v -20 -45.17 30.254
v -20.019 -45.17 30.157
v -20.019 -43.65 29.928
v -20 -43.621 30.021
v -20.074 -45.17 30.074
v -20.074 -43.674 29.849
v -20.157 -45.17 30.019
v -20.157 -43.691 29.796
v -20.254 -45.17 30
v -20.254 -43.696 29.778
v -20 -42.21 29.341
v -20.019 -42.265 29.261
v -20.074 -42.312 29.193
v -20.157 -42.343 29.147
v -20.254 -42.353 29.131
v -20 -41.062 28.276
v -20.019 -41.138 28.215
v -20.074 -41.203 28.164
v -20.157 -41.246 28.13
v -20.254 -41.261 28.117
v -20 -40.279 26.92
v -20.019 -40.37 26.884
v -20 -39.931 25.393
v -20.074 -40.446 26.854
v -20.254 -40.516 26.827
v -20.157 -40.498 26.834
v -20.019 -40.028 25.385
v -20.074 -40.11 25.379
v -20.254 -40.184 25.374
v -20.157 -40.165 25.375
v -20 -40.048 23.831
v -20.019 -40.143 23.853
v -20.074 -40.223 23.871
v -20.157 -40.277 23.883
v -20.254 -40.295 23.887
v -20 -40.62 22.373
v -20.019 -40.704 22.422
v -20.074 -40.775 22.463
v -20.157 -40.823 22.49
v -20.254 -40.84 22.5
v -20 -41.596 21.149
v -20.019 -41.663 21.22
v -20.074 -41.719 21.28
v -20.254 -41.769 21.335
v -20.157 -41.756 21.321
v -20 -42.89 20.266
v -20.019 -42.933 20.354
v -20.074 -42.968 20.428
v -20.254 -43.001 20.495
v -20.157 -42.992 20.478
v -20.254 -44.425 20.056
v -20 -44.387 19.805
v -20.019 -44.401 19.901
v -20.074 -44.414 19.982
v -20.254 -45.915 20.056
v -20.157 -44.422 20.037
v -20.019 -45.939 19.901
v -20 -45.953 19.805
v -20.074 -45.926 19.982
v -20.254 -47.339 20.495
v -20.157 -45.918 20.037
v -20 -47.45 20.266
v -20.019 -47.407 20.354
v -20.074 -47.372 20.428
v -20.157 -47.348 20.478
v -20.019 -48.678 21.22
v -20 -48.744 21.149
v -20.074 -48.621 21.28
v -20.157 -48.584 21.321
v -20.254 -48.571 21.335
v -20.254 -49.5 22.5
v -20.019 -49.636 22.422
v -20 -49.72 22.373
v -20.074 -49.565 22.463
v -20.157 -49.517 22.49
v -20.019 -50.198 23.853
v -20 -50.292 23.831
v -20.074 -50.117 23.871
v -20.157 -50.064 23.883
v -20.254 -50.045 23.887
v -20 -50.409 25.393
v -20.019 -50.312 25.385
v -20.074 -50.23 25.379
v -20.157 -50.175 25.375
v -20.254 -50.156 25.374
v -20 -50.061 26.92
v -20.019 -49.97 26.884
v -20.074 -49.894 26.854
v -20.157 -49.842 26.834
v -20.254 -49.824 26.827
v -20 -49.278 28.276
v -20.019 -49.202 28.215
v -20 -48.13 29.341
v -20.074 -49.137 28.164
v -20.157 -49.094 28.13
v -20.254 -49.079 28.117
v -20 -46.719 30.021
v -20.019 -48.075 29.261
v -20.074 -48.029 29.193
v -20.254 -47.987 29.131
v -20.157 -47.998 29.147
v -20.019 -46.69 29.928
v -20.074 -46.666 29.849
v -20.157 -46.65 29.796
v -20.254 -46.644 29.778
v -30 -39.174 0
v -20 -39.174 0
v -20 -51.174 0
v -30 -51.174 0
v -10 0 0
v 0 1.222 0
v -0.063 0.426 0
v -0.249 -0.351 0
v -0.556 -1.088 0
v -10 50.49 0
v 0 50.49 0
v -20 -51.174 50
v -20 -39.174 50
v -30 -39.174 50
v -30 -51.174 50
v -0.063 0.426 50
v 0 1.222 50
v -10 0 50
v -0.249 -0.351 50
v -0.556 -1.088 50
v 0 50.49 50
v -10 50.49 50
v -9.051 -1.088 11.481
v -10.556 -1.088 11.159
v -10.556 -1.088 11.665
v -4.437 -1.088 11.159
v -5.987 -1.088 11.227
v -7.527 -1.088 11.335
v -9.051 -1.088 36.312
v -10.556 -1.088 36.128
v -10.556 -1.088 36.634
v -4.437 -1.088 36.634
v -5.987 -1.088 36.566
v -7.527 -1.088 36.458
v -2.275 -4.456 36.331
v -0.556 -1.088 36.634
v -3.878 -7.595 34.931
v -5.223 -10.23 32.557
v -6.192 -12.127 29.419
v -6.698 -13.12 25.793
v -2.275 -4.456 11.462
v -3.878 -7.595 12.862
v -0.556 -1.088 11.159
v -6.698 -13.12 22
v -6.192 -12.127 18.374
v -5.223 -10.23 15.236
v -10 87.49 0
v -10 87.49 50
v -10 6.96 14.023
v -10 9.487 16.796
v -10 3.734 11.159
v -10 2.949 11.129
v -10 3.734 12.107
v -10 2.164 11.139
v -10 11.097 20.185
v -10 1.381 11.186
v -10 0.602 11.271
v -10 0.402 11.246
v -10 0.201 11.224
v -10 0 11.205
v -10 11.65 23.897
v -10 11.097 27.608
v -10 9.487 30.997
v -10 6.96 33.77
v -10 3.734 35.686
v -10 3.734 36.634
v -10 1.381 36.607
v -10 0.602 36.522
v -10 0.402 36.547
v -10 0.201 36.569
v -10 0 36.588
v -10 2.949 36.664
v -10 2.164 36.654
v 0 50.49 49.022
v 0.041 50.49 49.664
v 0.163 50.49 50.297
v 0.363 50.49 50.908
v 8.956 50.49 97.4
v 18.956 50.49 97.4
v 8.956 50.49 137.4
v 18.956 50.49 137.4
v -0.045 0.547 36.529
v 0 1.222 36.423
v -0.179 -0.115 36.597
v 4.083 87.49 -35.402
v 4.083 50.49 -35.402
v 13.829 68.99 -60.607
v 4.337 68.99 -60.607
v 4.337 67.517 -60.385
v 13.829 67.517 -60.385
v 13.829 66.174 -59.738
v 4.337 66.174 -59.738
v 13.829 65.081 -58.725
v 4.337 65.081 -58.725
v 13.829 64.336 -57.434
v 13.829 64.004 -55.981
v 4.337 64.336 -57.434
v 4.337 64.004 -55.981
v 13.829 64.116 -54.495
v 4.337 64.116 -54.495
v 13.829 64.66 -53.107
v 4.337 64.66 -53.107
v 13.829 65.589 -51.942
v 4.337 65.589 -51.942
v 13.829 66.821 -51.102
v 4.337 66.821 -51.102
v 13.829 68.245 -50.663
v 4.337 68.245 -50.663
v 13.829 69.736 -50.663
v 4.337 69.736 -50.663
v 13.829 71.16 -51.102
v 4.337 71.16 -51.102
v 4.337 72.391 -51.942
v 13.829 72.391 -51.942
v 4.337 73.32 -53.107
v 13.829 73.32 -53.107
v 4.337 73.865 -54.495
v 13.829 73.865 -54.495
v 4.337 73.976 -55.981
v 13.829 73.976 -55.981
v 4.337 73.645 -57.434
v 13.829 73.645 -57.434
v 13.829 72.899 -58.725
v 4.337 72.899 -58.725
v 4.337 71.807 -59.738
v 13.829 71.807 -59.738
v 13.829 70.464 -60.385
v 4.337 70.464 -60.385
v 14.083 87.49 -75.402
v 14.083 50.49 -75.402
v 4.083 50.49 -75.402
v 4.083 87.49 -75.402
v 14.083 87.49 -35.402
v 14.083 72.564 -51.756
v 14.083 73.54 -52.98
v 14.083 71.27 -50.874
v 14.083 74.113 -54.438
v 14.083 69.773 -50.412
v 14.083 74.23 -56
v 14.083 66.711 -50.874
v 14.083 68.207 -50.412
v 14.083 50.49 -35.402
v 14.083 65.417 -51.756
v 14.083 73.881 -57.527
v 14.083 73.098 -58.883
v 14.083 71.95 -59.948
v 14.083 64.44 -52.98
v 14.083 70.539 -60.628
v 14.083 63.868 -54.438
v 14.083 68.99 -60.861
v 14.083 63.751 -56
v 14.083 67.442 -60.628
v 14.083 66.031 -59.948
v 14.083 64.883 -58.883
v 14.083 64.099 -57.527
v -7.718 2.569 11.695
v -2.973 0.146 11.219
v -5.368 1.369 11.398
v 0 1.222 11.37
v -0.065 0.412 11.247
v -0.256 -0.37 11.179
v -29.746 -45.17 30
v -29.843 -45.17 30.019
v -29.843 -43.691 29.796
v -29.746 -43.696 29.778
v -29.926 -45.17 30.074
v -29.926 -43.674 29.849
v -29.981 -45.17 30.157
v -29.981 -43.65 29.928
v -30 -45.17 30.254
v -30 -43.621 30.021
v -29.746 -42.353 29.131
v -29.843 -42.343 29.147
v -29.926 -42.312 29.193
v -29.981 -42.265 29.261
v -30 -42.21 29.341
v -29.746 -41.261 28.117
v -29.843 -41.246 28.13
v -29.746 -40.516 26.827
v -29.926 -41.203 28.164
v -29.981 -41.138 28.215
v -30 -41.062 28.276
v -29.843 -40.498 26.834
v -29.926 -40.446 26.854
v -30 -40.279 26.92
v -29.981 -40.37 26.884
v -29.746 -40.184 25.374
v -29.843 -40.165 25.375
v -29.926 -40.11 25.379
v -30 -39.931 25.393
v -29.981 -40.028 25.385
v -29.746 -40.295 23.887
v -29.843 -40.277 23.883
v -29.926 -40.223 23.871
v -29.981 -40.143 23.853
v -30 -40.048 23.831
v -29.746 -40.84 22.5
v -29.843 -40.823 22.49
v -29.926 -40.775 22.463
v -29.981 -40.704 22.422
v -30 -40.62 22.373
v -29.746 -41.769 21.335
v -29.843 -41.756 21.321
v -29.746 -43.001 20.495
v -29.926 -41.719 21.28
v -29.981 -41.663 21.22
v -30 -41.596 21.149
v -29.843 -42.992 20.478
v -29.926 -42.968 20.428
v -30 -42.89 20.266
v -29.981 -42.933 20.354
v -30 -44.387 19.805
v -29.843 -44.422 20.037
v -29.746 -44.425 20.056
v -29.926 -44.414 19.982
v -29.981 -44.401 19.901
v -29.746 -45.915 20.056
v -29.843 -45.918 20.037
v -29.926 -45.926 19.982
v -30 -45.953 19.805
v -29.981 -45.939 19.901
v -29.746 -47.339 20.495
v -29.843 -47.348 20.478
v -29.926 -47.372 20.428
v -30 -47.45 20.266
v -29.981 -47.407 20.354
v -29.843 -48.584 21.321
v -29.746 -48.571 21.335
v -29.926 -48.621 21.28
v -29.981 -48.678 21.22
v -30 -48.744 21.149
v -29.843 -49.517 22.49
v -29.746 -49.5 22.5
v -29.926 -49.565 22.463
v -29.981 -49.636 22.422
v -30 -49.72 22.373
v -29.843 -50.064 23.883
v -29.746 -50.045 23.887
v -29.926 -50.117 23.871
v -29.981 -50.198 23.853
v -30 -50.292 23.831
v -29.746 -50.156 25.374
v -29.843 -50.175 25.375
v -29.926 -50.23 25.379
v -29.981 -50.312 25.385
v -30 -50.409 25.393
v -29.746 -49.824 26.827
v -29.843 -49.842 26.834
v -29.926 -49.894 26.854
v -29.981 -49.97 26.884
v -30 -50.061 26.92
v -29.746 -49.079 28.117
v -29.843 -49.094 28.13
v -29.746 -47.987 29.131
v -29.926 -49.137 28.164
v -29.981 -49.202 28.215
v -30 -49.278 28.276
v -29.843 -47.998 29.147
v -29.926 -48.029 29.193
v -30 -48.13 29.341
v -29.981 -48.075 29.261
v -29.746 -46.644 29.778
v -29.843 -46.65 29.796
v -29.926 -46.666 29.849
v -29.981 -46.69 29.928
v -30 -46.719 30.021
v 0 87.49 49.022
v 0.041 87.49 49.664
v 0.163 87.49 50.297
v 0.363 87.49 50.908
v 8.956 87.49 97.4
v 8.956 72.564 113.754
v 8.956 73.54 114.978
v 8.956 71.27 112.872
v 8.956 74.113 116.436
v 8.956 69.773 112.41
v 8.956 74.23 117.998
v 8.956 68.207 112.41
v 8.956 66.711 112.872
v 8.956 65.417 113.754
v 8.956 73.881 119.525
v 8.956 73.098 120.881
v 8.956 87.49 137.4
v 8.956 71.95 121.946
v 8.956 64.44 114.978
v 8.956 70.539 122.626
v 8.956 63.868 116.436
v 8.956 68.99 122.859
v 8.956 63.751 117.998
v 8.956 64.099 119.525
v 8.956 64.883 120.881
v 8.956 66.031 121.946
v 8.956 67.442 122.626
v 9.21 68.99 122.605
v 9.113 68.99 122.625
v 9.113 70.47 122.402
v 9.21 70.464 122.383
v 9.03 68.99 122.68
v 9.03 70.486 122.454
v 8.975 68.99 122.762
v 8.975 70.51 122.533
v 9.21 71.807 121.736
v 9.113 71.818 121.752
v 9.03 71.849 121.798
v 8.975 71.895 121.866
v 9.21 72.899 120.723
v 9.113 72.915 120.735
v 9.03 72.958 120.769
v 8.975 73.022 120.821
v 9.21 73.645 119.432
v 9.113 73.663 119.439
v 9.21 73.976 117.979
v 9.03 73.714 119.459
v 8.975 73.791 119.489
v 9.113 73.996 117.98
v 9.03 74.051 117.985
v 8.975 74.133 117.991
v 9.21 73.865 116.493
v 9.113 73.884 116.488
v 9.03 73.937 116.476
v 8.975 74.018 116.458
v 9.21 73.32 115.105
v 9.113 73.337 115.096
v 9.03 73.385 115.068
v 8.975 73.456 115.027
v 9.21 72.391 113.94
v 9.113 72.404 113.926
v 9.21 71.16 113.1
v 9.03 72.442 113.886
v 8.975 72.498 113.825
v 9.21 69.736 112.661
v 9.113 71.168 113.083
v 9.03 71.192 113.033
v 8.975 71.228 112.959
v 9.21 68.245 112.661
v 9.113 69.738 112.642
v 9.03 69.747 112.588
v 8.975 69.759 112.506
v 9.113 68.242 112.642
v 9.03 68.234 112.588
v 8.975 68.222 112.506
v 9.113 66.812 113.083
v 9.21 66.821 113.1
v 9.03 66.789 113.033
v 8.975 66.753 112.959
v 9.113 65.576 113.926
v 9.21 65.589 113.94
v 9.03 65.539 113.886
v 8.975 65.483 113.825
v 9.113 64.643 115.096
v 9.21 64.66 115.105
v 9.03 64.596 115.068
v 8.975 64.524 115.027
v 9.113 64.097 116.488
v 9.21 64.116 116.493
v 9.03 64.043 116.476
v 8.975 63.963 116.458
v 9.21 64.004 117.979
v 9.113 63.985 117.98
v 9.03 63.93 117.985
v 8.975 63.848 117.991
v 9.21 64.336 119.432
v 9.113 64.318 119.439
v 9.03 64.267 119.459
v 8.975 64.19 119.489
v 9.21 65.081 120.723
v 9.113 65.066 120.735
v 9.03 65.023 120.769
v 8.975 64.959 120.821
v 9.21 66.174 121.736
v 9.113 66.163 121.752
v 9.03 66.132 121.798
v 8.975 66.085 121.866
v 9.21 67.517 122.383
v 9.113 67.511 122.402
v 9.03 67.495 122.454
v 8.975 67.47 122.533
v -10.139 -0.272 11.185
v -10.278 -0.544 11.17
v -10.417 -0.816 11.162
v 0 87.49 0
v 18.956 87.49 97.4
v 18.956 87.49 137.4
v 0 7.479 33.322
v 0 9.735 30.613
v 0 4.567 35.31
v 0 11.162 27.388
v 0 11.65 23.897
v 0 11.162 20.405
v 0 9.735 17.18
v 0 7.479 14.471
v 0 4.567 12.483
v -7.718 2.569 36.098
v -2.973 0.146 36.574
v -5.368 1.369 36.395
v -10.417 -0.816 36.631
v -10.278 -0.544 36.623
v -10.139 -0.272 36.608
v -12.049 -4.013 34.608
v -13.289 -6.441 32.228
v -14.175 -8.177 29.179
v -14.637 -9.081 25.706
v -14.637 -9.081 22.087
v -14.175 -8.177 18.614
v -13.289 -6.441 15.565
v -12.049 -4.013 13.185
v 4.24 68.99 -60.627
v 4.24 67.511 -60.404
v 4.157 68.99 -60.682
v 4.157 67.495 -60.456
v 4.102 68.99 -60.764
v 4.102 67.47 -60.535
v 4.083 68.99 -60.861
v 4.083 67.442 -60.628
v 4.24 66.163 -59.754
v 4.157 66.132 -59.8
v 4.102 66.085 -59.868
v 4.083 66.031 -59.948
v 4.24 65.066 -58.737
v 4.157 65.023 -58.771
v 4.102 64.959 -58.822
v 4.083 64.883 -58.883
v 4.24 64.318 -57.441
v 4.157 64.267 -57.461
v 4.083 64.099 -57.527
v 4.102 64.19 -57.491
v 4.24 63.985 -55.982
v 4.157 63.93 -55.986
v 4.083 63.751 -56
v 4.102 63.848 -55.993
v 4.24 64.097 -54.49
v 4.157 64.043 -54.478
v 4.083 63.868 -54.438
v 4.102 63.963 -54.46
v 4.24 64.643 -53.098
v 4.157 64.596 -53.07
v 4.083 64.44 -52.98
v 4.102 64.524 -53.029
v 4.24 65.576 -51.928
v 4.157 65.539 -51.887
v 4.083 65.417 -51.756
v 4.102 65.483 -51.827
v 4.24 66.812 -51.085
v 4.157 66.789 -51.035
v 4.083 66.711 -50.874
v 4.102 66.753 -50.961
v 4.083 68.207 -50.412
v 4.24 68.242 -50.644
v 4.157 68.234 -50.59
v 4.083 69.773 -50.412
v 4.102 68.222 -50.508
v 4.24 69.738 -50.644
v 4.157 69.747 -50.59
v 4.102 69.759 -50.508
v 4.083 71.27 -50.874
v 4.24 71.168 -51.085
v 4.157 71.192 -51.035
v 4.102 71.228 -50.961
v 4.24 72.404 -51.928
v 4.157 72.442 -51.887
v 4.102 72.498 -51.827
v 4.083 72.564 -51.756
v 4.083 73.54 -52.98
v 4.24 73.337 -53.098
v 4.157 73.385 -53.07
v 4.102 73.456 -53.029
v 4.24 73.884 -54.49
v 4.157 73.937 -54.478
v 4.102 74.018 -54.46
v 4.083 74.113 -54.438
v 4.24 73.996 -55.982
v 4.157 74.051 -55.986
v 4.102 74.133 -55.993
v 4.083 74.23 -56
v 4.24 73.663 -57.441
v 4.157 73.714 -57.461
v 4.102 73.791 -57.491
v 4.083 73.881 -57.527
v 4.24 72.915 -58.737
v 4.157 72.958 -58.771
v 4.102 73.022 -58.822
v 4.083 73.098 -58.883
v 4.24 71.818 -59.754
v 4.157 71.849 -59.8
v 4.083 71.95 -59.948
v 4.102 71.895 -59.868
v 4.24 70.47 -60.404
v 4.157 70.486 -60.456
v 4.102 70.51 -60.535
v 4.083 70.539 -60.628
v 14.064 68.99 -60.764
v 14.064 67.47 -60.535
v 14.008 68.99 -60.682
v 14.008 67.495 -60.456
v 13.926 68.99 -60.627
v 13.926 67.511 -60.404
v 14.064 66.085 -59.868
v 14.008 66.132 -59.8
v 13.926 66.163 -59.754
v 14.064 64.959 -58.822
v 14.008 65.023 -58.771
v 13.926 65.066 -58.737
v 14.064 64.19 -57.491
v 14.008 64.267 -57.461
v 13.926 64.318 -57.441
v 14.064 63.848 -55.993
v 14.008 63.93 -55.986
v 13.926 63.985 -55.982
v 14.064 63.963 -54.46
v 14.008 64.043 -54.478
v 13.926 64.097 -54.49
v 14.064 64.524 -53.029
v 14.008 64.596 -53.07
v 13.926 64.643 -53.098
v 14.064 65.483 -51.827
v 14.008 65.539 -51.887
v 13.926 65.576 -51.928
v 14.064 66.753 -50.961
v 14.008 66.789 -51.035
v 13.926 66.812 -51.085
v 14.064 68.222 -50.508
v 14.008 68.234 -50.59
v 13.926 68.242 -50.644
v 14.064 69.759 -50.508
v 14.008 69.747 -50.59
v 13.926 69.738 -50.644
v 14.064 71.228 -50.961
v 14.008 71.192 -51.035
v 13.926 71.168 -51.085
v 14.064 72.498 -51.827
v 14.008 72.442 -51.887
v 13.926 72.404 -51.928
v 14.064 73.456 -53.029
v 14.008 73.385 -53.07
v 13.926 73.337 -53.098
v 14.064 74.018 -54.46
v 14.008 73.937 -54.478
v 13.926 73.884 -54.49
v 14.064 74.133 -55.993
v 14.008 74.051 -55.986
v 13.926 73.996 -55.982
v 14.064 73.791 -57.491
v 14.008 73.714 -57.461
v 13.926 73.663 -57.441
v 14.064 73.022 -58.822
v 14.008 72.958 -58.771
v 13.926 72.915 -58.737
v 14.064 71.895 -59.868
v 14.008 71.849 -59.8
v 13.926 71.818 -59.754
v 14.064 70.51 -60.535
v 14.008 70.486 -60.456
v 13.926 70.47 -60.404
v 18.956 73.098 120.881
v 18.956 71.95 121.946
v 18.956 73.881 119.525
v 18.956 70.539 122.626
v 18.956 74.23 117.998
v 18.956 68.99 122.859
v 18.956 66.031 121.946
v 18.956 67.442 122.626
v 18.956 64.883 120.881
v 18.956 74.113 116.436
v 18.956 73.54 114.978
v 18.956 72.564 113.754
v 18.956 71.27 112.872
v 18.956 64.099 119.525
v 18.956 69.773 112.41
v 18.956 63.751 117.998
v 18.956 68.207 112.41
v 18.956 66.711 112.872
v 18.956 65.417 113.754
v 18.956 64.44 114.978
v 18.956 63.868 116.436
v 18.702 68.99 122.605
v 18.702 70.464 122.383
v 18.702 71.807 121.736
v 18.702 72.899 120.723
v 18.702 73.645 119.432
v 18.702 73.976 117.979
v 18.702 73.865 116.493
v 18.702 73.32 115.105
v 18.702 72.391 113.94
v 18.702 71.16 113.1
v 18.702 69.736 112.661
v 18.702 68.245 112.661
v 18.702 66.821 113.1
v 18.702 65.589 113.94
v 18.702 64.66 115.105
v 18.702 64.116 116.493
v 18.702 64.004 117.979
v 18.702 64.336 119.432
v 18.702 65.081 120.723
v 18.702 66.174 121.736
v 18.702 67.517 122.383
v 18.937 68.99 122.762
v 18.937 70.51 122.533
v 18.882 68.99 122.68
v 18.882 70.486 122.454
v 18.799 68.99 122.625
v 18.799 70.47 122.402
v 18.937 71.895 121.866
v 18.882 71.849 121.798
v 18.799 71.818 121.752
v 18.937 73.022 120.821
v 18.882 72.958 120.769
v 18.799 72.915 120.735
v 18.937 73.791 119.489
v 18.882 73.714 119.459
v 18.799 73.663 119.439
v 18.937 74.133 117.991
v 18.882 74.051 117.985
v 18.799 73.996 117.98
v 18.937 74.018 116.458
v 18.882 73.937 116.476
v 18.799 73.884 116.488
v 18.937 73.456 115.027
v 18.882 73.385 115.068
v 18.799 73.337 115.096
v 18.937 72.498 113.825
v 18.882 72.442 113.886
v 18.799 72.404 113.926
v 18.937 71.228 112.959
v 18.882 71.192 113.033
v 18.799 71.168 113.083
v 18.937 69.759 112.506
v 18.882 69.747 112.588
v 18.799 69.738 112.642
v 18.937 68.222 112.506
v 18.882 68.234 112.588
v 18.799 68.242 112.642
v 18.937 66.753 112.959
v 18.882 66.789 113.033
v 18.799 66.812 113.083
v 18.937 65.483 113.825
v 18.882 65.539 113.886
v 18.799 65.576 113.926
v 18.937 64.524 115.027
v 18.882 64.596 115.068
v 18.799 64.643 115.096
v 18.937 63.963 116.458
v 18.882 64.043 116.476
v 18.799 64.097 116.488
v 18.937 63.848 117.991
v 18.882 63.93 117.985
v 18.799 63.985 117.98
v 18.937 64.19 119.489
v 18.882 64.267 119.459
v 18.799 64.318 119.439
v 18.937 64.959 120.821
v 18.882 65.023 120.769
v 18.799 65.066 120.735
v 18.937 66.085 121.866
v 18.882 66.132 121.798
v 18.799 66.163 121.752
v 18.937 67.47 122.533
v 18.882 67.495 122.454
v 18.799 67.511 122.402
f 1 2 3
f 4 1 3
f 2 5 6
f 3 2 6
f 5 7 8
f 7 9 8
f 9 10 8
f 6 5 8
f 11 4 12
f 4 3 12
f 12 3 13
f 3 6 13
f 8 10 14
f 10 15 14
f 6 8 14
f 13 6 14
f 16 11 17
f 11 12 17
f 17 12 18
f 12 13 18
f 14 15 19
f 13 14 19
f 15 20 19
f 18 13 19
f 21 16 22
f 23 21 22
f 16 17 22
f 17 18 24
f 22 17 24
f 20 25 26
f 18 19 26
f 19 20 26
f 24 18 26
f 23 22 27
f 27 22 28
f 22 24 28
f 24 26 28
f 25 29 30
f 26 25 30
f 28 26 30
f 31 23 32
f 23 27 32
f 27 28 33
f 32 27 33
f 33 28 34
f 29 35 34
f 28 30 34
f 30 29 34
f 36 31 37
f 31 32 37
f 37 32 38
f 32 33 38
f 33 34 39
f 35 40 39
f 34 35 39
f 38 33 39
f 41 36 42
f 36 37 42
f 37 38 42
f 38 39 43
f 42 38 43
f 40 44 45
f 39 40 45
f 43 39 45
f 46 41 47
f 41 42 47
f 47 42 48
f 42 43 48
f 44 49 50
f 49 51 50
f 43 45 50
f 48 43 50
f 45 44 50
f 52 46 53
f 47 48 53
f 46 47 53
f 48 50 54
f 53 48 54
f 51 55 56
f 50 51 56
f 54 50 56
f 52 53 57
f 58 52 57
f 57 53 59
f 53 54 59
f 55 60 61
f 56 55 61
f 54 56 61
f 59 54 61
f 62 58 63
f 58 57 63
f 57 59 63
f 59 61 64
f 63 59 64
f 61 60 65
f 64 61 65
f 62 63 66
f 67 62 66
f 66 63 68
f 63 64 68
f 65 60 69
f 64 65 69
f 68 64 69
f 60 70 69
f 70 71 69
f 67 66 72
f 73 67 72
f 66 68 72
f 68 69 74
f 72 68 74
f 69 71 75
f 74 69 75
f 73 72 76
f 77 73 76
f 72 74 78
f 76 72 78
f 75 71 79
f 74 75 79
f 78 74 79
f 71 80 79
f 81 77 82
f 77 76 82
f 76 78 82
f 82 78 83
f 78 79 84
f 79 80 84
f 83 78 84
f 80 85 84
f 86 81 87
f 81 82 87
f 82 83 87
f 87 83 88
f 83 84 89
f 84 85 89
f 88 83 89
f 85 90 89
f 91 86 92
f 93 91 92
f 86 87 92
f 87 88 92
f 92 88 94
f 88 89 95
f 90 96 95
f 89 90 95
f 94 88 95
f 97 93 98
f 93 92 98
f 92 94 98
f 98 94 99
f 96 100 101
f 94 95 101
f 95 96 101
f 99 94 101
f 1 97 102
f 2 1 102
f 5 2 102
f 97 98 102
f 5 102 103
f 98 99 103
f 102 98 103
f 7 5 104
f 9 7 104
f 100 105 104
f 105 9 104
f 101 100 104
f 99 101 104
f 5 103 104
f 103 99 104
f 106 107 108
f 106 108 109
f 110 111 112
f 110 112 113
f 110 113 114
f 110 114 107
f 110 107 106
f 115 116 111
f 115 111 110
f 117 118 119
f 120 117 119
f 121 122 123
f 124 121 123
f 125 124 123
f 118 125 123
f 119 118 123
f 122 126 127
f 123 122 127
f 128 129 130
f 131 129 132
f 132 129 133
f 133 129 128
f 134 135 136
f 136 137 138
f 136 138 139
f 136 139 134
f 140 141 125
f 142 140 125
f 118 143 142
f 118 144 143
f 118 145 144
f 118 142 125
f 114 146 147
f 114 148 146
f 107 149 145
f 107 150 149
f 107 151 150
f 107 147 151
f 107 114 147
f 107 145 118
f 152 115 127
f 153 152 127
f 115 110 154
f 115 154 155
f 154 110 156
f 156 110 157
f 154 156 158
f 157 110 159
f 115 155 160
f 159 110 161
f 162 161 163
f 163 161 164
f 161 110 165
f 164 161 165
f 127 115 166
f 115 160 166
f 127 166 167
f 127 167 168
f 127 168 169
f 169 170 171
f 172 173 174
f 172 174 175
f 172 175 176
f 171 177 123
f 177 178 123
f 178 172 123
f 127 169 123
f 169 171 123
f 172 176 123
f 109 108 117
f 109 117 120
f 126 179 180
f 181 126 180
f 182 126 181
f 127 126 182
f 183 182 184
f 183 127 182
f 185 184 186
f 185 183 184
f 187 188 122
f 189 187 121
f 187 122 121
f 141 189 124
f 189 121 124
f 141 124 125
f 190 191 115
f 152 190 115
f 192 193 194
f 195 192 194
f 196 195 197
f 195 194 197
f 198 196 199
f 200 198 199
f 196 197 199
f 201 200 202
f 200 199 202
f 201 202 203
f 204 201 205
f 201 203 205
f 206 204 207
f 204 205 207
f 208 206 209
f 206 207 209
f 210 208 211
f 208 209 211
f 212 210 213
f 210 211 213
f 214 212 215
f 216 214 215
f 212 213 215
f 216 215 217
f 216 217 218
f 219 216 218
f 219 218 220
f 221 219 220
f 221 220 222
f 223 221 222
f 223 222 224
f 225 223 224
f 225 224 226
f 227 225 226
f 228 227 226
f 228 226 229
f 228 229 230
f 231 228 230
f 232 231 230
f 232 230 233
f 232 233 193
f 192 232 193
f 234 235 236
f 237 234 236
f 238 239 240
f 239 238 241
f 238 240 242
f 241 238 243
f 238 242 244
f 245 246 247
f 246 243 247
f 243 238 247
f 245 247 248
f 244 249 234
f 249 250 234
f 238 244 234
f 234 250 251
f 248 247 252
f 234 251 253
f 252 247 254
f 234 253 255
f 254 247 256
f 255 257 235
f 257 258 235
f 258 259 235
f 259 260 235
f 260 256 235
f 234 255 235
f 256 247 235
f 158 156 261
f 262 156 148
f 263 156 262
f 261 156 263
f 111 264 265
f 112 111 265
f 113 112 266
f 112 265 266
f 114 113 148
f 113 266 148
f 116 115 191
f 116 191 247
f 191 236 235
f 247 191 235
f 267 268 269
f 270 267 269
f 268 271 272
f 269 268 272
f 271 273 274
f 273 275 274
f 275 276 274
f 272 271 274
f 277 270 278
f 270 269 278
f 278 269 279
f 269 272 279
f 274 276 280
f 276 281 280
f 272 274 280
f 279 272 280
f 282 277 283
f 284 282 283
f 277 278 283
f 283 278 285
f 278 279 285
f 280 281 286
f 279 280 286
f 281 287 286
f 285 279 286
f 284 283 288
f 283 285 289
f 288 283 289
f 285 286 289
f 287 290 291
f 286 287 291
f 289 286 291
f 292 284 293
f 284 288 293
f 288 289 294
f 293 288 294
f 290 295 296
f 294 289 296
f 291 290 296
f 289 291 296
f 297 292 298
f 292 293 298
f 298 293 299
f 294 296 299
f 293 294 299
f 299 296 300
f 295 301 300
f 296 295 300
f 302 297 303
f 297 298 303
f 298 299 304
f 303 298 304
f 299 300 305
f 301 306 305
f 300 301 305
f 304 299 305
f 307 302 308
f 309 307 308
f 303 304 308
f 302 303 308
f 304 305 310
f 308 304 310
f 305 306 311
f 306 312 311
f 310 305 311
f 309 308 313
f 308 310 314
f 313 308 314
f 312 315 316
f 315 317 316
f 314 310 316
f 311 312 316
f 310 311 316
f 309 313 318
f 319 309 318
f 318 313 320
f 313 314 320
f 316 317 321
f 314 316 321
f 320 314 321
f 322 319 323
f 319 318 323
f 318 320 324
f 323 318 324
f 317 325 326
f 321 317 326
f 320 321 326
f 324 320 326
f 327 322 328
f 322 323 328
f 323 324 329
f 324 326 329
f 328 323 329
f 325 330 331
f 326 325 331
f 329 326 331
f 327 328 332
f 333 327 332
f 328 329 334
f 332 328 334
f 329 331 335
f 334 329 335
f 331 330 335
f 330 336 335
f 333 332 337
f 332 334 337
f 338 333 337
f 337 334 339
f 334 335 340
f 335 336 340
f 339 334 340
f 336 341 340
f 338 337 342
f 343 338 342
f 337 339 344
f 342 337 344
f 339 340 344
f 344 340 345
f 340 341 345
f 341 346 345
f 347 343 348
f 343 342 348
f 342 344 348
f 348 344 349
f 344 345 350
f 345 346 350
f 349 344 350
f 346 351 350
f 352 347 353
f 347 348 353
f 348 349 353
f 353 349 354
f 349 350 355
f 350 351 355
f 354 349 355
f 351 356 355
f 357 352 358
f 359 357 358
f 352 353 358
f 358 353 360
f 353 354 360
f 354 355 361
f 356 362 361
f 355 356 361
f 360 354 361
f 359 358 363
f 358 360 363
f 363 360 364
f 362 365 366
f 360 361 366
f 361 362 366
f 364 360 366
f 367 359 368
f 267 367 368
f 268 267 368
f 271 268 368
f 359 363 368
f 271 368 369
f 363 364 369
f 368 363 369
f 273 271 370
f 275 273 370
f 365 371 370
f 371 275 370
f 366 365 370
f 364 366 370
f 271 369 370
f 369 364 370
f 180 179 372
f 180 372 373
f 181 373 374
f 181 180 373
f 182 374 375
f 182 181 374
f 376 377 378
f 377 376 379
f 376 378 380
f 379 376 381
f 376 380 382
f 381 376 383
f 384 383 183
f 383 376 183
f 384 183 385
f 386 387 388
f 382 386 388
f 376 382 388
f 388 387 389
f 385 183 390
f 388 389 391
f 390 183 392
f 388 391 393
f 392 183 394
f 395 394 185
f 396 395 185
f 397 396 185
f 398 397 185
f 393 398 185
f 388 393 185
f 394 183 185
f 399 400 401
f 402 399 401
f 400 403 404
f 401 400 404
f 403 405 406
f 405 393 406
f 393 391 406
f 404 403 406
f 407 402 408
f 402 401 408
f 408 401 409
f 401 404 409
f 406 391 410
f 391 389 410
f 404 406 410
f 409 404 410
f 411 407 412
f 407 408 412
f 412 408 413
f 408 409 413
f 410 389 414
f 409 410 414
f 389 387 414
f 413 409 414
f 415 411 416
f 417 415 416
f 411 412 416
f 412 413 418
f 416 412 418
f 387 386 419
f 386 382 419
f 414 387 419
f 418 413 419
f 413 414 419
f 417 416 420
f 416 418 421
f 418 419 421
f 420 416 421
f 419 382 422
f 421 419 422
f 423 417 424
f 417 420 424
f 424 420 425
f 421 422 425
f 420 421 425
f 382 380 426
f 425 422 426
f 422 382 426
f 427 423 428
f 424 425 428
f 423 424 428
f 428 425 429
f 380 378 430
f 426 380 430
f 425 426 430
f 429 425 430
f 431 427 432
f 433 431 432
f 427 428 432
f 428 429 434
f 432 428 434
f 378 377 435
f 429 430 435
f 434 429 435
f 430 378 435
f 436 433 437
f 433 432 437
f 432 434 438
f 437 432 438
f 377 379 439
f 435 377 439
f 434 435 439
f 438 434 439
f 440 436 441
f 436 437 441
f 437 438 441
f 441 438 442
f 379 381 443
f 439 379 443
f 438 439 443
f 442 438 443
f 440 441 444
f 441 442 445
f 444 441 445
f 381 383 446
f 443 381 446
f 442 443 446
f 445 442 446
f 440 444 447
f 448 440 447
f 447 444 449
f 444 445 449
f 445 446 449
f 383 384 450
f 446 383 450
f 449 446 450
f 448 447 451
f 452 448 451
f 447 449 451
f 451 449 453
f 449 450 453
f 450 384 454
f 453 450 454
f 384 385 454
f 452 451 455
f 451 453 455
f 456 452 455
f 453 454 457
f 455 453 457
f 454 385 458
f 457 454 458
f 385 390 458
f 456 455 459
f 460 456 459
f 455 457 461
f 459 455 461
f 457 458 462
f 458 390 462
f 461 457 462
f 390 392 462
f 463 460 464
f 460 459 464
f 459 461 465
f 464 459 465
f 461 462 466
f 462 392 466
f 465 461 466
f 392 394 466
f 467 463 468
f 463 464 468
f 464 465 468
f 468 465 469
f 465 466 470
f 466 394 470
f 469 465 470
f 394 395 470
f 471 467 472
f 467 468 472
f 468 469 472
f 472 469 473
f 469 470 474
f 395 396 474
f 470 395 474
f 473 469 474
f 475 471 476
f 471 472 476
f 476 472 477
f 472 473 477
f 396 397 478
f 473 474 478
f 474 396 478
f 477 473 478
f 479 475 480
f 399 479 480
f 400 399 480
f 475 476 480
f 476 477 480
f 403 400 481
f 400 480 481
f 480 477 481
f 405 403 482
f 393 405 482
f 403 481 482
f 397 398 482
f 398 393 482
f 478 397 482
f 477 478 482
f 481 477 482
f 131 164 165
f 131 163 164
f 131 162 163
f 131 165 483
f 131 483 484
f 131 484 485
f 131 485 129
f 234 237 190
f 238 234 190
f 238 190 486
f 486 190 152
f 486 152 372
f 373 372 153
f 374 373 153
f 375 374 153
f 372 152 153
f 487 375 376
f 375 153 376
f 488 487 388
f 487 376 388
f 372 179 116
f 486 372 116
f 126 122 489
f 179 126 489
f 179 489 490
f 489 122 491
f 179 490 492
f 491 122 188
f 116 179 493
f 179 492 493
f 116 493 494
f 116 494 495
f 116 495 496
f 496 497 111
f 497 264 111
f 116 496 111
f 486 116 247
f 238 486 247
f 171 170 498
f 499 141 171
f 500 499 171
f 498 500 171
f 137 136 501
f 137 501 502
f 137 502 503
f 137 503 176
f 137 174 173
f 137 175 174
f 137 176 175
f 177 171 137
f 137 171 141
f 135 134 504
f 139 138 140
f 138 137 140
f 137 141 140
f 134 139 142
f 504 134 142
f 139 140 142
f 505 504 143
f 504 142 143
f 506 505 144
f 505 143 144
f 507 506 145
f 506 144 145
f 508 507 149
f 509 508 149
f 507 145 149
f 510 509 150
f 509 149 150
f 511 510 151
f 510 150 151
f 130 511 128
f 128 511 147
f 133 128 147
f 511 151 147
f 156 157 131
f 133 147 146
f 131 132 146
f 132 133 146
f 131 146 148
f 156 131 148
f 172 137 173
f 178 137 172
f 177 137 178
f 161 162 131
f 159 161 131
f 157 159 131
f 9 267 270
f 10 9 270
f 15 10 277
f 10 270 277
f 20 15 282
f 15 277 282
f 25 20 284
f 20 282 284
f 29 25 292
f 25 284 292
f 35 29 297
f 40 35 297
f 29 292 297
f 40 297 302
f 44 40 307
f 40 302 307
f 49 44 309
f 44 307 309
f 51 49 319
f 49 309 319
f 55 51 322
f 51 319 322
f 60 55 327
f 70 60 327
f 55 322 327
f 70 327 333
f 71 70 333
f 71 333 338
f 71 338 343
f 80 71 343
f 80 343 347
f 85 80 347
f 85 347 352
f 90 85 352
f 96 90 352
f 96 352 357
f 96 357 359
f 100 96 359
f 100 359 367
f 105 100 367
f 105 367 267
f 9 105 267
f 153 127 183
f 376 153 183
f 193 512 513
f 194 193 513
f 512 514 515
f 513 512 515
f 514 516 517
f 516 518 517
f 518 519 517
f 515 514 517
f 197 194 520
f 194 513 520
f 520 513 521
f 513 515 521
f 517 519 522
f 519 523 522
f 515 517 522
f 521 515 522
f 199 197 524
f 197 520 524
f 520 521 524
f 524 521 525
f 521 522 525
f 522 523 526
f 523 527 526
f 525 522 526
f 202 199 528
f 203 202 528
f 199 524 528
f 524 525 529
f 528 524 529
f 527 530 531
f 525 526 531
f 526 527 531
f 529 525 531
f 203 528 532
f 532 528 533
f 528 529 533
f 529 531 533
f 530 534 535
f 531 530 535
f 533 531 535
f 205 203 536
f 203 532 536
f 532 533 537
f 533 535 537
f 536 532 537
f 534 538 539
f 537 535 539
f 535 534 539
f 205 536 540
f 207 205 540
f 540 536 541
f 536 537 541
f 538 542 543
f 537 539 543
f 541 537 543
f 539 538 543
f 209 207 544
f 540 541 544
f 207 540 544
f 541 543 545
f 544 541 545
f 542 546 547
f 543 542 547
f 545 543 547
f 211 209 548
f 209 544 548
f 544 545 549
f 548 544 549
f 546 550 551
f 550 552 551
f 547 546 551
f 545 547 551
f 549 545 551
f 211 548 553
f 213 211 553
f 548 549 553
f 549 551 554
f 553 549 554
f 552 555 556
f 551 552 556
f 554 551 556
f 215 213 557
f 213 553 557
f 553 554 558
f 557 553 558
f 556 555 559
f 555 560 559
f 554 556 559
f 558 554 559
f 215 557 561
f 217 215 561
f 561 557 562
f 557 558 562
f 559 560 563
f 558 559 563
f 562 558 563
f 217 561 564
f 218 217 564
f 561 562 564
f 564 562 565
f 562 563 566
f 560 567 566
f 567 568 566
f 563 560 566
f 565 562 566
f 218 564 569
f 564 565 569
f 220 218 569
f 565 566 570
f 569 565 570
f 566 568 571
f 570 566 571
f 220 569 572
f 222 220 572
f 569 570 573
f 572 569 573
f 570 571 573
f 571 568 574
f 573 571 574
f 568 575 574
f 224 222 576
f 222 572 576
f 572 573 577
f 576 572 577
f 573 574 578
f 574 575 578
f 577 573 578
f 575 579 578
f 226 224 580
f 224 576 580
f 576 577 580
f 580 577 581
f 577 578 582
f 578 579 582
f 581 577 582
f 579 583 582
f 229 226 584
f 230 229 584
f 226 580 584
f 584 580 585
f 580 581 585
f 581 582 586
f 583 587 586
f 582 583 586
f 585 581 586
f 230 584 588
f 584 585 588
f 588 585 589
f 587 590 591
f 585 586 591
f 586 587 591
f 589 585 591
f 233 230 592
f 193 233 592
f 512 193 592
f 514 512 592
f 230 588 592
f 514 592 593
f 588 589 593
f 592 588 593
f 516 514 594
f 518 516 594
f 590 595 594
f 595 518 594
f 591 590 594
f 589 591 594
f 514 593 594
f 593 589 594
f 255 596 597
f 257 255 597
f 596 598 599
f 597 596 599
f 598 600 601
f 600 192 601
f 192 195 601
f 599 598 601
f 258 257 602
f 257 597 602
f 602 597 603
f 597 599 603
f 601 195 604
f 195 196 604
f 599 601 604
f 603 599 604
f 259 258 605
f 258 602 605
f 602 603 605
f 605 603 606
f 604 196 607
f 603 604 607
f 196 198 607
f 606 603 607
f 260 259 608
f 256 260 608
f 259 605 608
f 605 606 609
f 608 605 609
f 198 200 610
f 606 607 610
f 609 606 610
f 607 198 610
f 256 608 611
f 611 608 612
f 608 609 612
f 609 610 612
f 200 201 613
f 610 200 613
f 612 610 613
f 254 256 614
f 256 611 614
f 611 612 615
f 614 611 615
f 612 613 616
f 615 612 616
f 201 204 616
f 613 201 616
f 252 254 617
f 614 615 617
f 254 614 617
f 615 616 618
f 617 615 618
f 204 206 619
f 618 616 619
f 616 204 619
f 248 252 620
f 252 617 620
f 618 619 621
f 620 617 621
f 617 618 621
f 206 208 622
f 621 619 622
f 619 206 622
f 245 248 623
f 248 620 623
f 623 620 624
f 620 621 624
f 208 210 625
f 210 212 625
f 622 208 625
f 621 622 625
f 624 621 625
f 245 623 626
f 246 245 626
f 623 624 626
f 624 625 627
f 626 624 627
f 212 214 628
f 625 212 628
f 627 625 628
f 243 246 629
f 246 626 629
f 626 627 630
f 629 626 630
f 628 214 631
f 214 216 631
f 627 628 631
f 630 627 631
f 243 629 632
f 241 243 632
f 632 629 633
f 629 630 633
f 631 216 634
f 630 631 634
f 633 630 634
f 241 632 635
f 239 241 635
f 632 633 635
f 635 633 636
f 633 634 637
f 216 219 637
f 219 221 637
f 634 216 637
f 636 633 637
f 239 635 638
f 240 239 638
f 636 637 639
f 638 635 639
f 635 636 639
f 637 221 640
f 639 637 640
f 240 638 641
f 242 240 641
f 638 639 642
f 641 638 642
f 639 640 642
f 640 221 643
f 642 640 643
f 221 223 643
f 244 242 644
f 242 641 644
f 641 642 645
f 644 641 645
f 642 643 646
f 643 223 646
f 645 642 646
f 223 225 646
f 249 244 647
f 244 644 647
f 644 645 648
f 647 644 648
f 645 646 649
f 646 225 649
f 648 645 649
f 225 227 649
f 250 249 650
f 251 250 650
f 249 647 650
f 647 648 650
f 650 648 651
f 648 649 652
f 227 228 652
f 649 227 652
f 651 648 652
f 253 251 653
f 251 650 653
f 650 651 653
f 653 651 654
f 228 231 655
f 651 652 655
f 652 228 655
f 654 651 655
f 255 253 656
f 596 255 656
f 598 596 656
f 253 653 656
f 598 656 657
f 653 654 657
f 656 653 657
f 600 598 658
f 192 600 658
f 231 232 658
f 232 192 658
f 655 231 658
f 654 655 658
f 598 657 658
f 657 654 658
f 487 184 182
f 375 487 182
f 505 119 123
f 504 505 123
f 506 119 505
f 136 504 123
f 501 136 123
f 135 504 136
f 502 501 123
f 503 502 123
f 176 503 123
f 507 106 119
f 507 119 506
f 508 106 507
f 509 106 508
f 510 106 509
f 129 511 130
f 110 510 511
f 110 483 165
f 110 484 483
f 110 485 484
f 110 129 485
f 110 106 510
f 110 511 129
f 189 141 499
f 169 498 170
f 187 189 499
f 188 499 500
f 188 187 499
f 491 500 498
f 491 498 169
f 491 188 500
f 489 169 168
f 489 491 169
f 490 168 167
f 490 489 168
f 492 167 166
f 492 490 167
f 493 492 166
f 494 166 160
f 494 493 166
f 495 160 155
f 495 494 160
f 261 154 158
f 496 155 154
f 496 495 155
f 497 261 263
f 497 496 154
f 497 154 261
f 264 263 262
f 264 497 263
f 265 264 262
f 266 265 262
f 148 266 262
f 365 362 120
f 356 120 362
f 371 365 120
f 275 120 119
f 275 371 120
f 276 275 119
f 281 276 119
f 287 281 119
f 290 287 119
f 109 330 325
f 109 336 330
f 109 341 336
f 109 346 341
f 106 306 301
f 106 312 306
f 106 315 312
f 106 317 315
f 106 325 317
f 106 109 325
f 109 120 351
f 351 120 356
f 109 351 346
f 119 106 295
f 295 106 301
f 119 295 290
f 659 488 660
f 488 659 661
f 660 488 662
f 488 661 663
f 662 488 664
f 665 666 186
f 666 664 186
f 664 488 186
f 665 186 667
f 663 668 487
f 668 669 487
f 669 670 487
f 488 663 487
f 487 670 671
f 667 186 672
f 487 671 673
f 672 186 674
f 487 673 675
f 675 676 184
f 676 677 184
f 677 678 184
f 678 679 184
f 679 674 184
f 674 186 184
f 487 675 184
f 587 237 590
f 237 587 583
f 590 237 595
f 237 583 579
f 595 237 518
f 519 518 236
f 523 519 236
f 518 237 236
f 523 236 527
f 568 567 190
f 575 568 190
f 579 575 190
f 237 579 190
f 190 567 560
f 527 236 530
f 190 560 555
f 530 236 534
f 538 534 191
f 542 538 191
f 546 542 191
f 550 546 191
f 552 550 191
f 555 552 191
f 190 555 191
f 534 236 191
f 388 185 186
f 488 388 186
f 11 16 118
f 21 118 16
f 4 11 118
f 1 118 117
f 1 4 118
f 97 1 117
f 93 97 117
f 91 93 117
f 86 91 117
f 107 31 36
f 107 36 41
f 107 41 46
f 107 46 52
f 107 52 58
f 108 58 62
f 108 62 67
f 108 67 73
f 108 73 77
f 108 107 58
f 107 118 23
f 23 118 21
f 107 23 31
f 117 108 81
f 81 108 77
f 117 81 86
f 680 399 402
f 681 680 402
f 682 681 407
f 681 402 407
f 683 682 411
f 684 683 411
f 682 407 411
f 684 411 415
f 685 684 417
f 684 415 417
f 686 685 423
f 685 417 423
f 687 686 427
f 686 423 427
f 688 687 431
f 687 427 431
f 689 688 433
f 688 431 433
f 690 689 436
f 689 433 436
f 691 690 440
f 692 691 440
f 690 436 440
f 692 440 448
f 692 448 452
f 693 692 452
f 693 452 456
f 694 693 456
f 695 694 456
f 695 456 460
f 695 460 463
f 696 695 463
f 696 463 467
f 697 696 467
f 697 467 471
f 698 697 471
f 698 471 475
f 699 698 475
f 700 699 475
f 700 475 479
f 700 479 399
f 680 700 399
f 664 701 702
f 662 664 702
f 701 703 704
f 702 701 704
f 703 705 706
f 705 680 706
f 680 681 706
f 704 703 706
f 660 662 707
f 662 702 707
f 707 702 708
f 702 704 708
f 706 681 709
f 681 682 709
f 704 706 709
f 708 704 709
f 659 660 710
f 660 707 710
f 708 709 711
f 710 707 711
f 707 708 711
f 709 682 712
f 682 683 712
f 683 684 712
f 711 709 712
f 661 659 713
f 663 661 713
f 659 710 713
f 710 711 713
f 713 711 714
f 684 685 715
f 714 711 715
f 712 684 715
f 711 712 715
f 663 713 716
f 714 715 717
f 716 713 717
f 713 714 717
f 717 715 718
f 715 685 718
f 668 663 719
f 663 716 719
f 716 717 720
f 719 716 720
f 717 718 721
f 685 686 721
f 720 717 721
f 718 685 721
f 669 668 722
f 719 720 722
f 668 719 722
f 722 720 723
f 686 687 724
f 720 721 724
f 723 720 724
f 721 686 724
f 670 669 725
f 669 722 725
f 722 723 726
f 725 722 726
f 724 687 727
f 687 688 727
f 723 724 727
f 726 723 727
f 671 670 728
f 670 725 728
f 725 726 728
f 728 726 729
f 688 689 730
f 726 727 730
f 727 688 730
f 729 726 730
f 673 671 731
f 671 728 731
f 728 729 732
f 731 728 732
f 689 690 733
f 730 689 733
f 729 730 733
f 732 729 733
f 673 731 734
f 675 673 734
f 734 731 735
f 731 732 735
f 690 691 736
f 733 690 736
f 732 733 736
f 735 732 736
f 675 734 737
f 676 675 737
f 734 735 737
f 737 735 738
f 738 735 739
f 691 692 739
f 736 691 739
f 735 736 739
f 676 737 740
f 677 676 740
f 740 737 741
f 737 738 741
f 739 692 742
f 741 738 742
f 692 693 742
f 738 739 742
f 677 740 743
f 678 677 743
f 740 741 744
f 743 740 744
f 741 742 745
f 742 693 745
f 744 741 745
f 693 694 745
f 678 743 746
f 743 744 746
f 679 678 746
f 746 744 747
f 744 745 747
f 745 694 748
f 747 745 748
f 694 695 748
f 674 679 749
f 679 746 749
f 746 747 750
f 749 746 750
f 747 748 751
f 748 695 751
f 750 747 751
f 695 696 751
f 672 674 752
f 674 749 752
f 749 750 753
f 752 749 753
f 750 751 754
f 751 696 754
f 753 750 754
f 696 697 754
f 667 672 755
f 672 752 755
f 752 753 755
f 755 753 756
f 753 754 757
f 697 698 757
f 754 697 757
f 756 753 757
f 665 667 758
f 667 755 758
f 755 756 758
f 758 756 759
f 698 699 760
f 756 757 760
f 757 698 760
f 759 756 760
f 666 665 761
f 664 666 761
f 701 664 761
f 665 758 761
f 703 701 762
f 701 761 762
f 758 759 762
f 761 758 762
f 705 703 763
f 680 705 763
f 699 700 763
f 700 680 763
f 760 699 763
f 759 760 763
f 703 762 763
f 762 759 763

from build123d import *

# Parameters (mm, degrees)
BOSS_EXTRUDE1_DEPTH = 50
BOSS_EXTRUDE2_DEPTH = 37
FILLET1_R           = 5.08
FILLET2_R           = 5.08
SKETCH3_R           = 5
CUT_EXTRUDE3_DEPTH  = 50.8
SKETCH4_R           = 5
CUT_EXTRUDE4_DEPTH  = 171.088377471
FILLET4_R           = 0.254
FILLET5_R           = 0.254
FILLET6_R           = 0.254
FILLET7_R           = 0.254
FILLET8_R           = 0.254
FILLET9_R           = 0.254
CUT_EXTRUDE10_DEPTH = 50.8
CUT_EXTRUDE11_DEPTH = 50.8


with BuildPart() as part:
    # Sketch1 → Boss-Extrude1 (new body)
    with BuildSketch(Plane.XY):
        Polygon((-10, 50.490294942), (0, 50.490294942), (0, 0), (-20, -39.173504696), (-20, -51.173504696), (-30, -51.173504696), (-30, -39.173504696), (-10, 0), align=None)
    extrude(amount=BOSS_EXTRUDE1_DEPTH)

    # Sketch2 → Boss-Extrude2 (add)
    with BuildSketch(Plane(origin=(0, 50.490294942, 0), x_dir=(1, 0, 0), z_dir=(0, 1, 0))):
        Polygon((-10, -50), (8.955903958, -97.400232567), (8.955903958, -137.400232567), (18.955903958, -137.400232567), (18.955903958, -97.400232567), (0, -50), (0, 0), (14.082883878, 35.4021936), (14.082883878, 75.4021936), (4.082883878, 75.4021936), (4.082883878, 35.4021936), (-10, 0), align=None)
    extrude(amount=BOSS_EXTRUDE2_DEPTH)

    # Fillet1
    fillet1_edges = [part.edges().sort_by_distance(p)[0] for p in [
        (0, 0, 25),
    ]]
    fillet(fillet1_edges, radius=FILLET1_R)

    # Fillet2
    # the kernel refuses this fillet: 5.08 mm, written as the material it adds along each edge
    with BuildSketch(Plane(origin=(0, 50.490294942, 50), x_dir=(0, 0, -1), z_dir=(0, 1, 0))) as fillet2_piece_1:
        with BuildLine():
            CenterArc((FILLET2_R * 0.192542896513, -FILLET2_R), FILLET2_R, 90, 21.797044179)
            Line((-FILLET2_R * 0.17877703906, -FILLET2_R * 0.0714950159281), (0, 0))
            Line((0, 0), (FILLET2_R * 0.192542896513, 0))
        make_face()
    extrude(amount=37)

    # Sketch3 → Cut-Extrude3 (cut)
    with BuildSketch(Plane.ZY.offset(10)):
        with Locations(Location((-55.607256236, 68.990294942, 0), (0, 0, 180))):
            Circle(SKETCH3_R)
        with Locations((117.605295203, 68.990294942)):
            Circle(SKETCH3_R)
    extrude(amount=-CUT_EXTRUDE3_DEPTH, mode=Mode.SUBTRACT)

    # Sketch4 → Cut-Extrude4 (cut, through all)
    with BuildSketch(Plane.ZY.offset(30)):
        with Locations((25, -45.170029219)):
            Circle(SKETCH4_R)
    extrude(amount=-CUT_EXTRUDE4_DEPTH, mode=Mode.SUBTRACT)

    # Fillet4
    fillet4_edges = [part.edges().sort_by_distance(p)[0] for p in [
        (-20, -45.170029219, 20),
    ]]
    fillet(fillet4_edges, radius=FILLET4_R)

    # Fillet5
    fillet5_edges = [part.edges().sort_by_distance(p)[0] for p in [
        (-30, -45.170029219, 20),
    ]]
    fillet(fillet5_edges, radius=FILLET5_R)

    # Fillet6
    fillet6_edges = [part.edges().sort_by_distance(p)[0] for p in [
        (14.082883878, 68.990294942, -50.607256236),
    ]]
    fillet(fillet6_edges, radius=FILLET6_R)

    # Fillet7
    fillet7_edges = [part.edges().sort_by_distance(p)[0] for p in [
        (4.082883878, 68.990294942, -50.607256236),
    ]]
    fillet(fillet7_edges, radius=FILLET7_R)

    # Fillet8
    fillet8_edges = [part.edges().sort_by_distance(p)[0] for p in [
        (18.955903958, 68.990294942, 112.605295203),
    ]]
    fillet(fillet8_edges, radius=FILLET8_R)

    # Fillet9
    fillet9_edges = [part.edges().sort_by_distance(p)[0] for p in [
        (8.955903958, 68.990294942, 112.605295203),
    ]]
    fillet(fillet9_edges, radius=FILLET9_R)

    # Sketch18 → Cut-Extrude10 (cut)
    with BuildSketch(Plane(origin=(0, 0, 0), x_dir=(-0.4547141869090671, -0.8906374168109186, 0), z_dir=(0.8906374168109186, -0.4547141869090671, 0))):
        with BuildLine():
            Line((1.22178269, -11.158701567), (1.22178269, -36.634326405))
            ThreePointArc((1.22178269, -36.634326405), (14.872545986, -23.896513986), (1.22178269, -11.158701567))
        make_face()
    extrude(amount=-CUT_EXTRUDE10_DEPTH, mode=Mode.SUBTRACT)

    # Sketch20 → Cut-Extrude11 (cut)
    with BuildSketch(Plane(origin=(0, 0, 0), x_dir=(0, 0, -1), z_dir=(1, 0, 0))):
        with BuildLine():
            Line((-11.158701567, -1.088165379), (-36.634326405, -1.088165379))
            ThreePointArc((-36.634326405, -1.088165379), (-23.896513986, 11.64964704), (-11.158701567, -1.088165379))
        make_face()
    extrude(amount=-CUT_EXTRUDE11_DEPTH, mode=Mode.SUBTRACT)


solid = part.part
